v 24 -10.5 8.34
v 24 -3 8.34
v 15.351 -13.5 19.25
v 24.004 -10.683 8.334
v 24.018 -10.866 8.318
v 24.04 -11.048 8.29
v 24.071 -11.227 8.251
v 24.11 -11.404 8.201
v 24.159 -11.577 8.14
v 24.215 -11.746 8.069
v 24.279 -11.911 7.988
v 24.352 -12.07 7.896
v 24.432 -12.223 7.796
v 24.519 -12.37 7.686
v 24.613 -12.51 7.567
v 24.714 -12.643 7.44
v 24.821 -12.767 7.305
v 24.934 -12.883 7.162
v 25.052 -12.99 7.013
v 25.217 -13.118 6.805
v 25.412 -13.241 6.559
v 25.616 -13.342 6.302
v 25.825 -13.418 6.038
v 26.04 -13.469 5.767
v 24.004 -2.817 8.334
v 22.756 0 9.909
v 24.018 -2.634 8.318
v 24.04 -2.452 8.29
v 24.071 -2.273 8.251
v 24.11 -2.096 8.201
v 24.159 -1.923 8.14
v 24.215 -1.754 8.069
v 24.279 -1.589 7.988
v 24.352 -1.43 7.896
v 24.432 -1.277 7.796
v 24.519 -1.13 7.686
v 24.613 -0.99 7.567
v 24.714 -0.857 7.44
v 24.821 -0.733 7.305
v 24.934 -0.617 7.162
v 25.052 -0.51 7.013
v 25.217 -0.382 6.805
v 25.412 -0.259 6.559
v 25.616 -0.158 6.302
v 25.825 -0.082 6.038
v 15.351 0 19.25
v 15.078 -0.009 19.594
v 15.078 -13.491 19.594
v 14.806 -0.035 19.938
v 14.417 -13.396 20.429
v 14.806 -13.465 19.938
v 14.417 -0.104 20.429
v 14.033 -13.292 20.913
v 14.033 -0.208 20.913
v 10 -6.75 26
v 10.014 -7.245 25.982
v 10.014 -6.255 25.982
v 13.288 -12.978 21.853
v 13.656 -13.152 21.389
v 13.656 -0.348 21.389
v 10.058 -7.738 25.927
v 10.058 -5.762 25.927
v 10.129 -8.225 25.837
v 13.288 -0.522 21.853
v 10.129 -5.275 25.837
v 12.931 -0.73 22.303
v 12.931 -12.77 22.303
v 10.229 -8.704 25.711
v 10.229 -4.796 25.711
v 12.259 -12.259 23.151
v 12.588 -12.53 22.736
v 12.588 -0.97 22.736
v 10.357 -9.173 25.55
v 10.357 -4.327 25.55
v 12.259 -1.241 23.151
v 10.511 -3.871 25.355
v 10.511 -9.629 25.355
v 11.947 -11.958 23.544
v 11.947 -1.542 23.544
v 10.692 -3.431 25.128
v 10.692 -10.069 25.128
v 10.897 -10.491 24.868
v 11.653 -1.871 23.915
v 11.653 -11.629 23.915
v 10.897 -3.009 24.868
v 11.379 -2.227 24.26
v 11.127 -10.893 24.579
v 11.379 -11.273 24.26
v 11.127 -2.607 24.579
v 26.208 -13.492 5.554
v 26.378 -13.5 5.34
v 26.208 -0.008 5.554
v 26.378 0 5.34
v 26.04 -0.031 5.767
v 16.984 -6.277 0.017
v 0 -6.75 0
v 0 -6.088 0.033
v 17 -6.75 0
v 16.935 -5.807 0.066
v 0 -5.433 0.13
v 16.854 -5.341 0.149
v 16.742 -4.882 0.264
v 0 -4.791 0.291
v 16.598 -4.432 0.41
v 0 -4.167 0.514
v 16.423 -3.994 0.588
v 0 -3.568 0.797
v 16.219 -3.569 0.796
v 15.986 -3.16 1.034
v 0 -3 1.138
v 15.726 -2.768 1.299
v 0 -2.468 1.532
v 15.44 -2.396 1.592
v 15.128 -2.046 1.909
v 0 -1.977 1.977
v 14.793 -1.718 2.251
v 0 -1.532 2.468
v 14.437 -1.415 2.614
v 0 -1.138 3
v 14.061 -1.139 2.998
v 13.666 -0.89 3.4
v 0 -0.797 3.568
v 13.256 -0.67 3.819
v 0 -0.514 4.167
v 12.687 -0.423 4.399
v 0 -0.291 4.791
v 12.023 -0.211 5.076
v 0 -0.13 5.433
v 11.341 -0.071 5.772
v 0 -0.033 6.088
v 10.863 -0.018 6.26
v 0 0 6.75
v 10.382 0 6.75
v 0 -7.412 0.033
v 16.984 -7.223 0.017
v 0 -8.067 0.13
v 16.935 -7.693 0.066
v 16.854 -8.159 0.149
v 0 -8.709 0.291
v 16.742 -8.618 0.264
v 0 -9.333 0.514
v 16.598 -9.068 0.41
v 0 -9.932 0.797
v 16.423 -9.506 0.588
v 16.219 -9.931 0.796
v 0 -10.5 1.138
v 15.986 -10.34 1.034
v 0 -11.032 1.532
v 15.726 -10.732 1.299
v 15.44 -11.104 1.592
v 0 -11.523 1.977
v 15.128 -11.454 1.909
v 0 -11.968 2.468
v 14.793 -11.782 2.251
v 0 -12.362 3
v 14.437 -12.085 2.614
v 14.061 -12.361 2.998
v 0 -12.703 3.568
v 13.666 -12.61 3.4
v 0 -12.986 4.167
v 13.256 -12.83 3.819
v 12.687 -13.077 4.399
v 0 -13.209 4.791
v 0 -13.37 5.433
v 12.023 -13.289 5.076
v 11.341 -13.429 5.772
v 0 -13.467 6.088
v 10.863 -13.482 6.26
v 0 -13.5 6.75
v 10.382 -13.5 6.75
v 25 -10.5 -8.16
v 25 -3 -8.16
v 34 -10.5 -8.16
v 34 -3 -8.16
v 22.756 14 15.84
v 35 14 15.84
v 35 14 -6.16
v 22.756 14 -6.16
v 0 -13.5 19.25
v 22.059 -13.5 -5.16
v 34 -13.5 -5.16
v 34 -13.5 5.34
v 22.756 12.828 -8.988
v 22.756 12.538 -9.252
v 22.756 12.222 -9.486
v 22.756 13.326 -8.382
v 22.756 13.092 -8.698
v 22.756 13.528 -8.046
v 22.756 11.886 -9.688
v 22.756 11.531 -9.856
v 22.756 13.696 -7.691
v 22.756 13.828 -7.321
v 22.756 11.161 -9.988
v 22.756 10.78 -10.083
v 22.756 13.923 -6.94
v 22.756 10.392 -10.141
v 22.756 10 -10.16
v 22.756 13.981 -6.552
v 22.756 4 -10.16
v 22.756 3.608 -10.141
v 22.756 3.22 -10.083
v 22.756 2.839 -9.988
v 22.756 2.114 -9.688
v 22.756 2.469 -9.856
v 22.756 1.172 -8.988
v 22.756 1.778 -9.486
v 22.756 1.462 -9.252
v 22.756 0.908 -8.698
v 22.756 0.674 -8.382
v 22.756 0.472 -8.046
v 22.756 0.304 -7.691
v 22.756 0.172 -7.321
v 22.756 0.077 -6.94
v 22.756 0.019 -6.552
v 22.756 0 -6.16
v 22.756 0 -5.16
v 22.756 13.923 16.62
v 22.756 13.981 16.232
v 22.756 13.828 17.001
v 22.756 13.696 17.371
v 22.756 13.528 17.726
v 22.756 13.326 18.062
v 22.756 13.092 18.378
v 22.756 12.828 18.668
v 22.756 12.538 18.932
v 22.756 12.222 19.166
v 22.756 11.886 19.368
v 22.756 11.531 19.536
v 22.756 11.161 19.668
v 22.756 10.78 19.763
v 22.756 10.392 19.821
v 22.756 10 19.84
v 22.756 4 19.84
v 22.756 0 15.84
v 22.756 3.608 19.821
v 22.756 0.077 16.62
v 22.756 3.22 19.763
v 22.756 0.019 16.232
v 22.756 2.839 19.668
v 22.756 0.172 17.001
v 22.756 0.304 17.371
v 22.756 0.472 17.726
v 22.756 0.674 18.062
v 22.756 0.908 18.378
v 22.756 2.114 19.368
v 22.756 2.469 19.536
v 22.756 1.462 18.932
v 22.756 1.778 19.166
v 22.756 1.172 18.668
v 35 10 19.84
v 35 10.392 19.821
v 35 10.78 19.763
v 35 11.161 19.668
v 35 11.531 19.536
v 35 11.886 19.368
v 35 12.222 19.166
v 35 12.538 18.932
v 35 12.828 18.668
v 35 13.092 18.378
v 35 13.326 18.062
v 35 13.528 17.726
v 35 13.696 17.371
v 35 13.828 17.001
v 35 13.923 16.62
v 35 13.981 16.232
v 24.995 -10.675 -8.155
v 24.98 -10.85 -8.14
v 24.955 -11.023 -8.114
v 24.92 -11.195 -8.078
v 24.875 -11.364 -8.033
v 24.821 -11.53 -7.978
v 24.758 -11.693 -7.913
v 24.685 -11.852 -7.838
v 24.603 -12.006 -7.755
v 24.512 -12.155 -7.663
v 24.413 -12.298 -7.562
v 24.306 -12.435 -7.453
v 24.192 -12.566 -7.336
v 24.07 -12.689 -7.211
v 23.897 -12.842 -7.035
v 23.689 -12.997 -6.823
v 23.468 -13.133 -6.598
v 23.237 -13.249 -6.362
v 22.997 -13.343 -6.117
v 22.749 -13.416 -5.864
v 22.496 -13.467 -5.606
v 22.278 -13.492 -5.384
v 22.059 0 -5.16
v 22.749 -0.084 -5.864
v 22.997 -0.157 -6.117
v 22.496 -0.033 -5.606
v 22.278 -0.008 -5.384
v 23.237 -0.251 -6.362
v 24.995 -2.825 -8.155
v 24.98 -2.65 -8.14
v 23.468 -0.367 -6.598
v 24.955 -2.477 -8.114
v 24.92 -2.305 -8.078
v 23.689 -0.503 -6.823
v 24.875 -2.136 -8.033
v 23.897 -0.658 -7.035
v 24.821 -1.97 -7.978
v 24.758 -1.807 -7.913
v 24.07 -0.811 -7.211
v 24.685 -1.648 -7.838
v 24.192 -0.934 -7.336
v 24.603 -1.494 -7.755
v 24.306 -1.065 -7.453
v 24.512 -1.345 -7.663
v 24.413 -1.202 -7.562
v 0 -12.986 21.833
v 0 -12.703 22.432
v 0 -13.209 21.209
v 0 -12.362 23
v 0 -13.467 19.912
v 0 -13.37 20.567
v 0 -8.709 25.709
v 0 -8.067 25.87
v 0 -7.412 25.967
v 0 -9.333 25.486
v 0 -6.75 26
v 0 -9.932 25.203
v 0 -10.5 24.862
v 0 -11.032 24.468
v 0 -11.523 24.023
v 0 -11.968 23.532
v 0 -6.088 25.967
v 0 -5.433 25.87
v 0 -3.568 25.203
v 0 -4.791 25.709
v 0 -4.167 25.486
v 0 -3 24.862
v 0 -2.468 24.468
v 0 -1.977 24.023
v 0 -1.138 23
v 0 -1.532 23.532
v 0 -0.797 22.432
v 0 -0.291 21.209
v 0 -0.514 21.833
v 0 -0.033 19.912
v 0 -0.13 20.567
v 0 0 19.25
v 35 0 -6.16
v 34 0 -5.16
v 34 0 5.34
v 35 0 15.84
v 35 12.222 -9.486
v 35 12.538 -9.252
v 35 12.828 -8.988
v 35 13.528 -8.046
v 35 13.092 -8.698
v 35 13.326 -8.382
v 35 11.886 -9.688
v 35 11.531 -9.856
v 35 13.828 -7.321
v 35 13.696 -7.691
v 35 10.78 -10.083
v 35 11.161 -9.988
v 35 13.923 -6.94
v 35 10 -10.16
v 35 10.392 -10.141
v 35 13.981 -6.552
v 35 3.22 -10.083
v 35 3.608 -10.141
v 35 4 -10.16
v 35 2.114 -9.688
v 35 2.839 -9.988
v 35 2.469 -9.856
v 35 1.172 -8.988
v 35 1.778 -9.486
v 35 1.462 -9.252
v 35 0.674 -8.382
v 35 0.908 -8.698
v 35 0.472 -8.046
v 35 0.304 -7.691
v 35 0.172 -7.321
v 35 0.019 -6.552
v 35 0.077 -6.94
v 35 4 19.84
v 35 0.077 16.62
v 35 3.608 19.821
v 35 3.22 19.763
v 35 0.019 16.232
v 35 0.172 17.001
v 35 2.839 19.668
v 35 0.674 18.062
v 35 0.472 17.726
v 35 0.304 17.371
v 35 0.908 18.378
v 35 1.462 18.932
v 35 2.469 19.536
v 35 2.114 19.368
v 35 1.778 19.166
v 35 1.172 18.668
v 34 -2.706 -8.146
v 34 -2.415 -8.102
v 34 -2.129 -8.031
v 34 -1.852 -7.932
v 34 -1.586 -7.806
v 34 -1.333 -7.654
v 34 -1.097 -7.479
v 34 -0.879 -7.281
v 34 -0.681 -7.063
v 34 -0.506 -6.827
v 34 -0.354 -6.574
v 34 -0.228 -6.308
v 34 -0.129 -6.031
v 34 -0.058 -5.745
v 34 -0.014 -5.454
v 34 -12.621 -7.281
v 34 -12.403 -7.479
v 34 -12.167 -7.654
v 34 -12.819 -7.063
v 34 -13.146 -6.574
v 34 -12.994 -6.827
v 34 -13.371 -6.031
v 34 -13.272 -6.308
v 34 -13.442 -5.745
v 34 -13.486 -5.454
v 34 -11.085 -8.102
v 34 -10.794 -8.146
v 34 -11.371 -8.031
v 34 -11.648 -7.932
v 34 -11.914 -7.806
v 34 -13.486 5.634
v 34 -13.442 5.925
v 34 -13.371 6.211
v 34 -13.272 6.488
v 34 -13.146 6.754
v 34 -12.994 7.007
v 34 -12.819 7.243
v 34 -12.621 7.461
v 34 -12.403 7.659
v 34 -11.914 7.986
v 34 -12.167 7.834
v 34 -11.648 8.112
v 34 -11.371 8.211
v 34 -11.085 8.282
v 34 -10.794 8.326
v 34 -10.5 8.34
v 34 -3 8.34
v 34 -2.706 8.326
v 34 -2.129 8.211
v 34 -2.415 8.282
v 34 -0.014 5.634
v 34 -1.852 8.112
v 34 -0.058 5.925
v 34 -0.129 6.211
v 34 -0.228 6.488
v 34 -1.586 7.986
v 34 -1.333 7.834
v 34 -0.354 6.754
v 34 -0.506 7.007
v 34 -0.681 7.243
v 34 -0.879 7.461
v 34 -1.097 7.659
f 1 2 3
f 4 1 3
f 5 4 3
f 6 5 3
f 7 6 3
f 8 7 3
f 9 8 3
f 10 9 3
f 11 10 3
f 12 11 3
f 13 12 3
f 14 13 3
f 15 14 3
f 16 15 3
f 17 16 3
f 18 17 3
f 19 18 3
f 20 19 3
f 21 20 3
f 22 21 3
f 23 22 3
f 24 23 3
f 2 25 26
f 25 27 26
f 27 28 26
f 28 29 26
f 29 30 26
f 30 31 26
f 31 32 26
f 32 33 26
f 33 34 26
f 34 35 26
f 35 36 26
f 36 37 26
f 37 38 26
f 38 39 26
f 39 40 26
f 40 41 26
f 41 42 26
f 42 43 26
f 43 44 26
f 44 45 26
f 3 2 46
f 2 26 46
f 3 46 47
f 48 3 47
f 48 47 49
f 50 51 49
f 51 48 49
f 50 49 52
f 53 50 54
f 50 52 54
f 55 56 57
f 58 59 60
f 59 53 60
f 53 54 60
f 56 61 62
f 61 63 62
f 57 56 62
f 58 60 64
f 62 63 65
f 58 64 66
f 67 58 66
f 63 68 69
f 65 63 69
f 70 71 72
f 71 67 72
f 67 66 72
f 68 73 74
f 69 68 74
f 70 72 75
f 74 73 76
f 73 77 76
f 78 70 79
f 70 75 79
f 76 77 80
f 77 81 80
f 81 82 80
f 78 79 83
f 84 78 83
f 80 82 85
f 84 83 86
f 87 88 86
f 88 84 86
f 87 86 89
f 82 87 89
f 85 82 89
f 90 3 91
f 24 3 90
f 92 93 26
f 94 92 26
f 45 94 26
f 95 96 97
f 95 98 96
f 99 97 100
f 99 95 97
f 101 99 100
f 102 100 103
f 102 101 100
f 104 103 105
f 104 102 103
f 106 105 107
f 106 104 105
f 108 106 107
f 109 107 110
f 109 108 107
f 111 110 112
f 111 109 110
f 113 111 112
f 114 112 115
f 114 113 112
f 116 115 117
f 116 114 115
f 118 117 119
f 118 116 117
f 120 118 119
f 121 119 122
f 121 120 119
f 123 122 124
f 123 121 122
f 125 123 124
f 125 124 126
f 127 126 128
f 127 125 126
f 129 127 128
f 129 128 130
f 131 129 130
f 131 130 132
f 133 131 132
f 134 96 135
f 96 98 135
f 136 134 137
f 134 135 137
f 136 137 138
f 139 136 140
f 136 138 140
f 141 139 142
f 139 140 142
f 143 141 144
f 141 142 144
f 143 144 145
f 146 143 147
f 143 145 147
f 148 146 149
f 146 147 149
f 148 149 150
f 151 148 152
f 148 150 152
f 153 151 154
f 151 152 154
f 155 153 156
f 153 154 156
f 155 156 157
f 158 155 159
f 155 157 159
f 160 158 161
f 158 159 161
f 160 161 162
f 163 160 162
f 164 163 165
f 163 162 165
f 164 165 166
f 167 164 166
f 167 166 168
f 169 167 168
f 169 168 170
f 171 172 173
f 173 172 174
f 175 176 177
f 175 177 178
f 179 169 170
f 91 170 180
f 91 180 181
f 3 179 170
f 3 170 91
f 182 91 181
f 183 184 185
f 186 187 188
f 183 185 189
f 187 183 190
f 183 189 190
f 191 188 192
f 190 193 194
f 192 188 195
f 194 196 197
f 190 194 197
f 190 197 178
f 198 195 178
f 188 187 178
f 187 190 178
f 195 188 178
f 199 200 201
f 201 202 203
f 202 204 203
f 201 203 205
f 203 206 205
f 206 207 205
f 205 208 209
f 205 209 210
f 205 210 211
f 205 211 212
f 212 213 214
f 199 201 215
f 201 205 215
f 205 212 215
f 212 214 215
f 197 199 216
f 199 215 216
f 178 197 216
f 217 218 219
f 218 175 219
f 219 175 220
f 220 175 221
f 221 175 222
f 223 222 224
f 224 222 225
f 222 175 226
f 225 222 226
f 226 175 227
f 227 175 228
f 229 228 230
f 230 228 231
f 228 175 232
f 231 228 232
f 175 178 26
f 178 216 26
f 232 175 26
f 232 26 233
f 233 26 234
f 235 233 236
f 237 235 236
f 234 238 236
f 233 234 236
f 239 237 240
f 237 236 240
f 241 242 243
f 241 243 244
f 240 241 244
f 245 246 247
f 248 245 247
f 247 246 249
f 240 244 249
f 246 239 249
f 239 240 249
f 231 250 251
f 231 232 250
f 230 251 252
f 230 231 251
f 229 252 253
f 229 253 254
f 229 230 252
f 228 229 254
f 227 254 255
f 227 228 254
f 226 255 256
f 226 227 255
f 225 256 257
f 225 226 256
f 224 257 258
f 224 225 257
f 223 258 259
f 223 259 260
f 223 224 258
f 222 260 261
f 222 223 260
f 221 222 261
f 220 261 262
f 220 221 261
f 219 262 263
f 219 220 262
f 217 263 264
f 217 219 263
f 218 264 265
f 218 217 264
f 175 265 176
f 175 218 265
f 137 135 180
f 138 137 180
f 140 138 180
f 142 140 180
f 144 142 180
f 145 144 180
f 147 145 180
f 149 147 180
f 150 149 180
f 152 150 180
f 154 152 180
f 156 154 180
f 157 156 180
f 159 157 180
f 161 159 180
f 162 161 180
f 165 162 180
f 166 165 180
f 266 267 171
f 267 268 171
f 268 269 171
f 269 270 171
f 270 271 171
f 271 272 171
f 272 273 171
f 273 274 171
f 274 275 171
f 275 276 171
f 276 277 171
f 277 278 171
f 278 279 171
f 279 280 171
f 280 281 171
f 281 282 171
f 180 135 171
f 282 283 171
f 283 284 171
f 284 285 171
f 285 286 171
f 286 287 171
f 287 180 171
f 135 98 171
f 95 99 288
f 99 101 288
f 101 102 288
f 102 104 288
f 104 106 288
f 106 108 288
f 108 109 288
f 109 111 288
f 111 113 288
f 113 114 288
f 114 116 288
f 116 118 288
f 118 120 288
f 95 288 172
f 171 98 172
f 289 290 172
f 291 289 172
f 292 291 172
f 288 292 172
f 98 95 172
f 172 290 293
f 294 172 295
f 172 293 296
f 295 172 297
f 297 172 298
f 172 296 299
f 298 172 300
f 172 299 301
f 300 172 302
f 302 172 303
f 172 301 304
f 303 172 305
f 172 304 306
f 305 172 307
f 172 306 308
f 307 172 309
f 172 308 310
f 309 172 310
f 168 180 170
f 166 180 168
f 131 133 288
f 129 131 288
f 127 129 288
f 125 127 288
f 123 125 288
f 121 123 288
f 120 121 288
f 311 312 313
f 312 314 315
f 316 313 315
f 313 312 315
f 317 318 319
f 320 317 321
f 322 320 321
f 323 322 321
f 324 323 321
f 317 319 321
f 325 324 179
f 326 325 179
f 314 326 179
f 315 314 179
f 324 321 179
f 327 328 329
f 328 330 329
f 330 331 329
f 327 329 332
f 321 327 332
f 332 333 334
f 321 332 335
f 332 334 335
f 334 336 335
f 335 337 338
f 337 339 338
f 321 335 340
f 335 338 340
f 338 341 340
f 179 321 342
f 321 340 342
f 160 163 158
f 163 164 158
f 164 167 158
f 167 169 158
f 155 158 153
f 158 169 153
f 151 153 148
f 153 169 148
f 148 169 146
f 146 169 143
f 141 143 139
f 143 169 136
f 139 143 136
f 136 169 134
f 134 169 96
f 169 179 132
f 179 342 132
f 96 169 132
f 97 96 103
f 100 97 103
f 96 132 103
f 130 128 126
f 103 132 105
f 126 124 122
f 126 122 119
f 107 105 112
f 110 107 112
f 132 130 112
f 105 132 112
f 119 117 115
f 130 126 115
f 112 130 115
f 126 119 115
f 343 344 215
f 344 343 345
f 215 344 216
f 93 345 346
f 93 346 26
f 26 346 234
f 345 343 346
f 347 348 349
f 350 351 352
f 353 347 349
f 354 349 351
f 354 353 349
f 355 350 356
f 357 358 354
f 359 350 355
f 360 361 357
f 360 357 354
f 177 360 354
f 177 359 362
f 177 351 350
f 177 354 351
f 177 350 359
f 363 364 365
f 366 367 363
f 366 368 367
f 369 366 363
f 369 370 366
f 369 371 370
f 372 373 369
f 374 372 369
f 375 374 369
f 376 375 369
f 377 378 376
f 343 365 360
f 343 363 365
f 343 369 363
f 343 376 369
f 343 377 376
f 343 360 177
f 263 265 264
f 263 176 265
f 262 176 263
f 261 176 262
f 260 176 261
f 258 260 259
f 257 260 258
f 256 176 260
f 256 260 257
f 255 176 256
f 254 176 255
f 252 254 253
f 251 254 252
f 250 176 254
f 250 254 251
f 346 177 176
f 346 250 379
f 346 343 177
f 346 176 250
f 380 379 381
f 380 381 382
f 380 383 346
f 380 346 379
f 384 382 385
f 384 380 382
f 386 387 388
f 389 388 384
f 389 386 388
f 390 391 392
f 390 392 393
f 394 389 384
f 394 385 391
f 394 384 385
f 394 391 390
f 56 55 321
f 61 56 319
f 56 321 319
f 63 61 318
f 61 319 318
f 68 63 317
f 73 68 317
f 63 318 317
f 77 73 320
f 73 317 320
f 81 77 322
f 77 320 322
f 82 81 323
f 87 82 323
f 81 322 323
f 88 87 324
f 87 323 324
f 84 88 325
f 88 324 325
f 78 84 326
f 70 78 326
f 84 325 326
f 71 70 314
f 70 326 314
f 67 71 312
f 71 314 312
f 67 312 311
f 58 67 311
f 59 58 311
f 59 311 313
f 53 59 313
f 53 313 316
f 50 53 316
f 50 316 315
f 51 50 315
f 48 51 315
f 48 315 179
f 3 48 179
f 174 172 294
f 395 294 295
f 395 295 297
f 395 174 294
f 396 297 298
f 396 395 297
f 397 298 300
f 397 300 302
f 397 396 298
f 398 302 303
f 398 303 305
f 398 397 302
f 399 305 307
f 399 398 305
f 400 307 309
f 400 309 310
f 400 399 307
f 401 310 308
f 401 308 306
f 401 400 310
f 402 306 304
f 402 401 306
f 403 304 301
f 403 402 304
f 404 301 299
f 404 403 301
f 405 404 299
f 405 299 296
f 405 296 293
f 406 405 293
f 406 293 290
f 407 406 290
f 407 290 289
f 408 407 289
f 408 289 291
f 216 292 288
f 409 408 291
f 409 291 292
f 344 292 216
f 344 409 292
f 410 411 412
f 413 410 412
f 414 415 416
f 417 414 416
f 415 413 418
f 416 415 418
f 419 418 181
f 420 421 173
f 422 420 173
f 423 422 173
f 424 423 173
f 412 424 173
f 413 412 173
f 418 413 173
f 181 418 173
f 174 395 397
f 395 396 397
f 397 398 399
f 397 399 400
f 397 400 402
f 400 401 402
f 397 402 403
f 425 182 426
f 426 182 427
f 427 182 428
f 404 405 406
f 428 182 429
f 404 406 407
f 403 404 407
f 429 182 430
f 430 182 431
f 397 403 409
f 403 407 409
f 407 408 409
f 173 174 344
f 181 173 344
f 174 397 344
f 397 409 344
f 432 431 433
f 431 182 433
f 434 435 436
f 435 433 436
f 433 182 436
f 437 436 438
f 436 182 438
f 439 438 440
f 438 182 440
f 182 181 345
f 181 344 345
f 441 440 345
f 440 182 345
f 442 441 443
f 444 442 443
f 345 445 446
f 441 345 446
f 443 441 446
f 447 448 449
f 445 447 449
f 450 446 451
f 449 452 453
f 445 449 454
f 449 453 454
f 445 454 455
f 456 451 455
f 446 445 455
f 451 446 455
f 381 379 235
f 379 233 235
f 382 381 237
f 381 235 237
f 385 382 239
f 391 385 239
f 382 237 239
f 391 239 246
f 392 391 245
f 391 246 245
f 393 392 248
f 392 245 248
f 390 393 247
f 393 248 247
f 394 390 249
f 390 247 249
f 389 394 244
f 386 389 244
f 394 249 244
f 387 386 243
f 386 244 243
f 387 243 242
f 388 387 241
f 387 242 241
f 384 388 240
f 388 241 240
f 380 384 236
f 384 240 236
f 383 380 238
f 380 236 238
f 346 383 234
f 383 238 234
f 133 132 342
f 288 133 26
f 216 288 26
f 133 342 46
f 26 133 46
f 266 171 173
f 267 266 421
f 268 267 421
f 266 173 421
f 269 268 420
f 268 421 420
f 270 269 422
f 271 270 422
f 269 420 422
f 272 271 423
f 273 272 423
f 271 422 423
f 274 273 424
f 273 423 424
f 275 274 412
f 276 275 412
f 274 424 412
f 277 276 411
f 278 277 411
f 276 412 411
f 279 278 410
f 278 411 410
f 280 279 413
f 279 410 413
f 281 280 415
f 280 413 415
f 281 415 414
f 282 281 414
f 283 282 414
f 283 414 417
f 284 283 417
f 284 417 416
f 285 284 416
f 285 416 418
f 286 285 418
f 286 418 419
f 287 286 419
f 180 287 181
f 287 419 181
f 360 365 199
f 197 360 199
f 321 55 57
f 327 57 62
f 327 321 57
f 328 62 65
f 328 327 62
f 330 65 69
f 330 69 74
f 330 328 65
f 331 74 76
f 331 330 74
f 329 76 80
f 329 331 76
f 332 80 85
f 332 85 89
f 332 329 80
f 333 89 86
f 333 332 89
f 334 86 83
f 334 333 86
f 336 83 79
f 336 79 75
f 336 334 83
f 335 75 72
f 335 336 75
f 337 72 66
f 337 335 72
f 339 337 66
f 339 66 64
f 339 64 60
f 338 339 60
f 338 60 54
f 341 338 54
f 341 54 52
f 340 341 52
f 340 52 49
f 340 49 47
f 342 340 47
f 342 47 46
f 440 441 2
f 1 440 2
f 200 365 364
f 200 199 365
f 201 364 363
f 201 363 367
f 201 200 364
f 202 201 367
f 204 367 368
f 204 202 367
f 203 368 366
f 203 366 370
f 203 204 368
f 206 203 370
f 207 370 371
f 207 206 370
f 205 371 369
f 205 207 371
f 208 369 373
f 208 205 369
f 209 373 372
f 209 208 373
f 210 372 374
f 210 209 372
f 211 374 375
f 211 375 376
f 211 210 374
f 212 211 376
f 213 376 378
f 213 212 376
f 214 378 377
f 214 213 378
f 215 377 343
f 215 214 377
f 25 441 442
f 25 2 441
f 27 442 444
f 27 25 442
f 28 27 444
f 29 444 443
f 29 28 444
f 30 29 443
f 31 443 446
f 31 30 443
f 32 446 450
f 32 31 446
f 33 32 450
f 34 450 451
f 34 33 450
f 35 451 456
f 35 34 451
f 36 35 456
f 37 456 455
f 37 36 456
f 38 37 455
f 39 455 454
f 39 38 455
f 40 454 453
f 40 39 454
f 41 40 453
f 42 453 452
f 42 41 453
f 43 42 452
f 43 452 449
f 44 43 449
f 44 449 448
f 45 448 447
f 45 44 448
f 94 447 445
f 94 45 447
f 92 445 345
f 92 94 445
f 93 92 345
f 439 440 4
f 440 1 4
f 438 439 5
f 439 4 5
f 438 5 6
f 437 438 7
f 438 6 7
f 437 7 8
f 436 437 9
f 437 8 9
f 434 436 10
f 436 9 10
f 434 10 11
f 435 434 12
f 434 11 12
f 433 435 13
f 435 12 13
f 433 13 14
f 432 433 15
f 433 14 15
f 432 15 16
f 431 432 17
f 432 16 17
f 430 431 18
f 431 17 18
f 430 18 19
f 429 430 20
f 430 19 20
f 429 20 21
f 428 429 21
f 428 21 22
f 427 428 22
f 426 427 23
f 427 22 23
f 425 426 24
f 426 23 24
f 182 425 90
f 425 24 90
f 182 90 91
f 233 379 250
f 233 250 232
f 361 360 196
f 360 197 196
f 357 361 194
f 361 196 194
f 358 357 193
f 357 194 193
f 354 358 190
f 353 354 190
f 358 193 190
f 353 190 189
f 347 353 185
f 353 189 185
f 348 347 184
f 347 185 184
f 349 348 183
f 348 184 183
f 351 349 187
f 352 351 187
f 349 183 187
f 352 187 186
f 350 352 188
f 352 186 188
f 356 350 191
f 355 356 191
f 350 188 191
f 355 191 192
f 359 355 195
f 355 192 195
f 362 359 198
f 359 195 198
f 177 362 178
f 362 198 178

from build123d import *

# Parameters (mm, degrees)
F1_DEPTH = 13.5
F2_R     = 6.74999
F3_R     = 3
F4_W     = 12.2435482951
F4_H     = 30
F5_DEPTH = 14
F6_R     = 4


# Not quite as in the source:
# - a fillet or chamfer is up to 0.001 mm smaller than in the source, because OpenCascade refuses the exact size


with BuildPart() as f1:
    # F0 (on Front) → F1 (new body)
    with BuildSketch(Plane.XZ):
        Polygon((0, 26), (0, 0), (17, 0), (25, -8.16), (34, -8.16), (34, 8.34), (24, 8.34), (10, 26), align=None)
    extrude(amount=F1_DEPTH)

    # F2 (radius 6.75 in the source; OpenCascade refuses exactly that, so slightly less here)
    f2_edges = [f1.edges().sort_by_distance(p)[0] for p in [
        (5, 0, 26),
        (5, -13.5, 26),
        (8.5, 0, 0),
        (8.5, -13.5, 0),
    ]]
    fillet(f2_edges, radius=F2_R)

    # F3
    f3_edges = [f1.edges().sort_by_distance(p)[0] for p in [
        (29, -13.5, 8.34),
        (29, 0, 8.34),
        (29.5, 0, -8.16),
        (29.5, -13.5, -8.16),
    ]]
    fillet(f3_edges, radius=F3_R)

    # F4 (on face) → F5 (join)
    with BuildSketch(Plane(origin=(0, 0, 0), x_dir=(-1, 0, 0), z_dir=(0, 1, 0))):
        with Locations((-28.8782258524, 4.84)):
            Rectangle(F4_W, F4_H)
    extrude(amount=F5_DEPTH)

    # F6
    f6_edges = [f1.edges().sort_by_distance(p)[0] for p in [
        (28.878226, 14, 19.84),
        (28.878226, 0, 19.84),
        (28.878226, 14, -10.16),
        (28.878226, 0, -10.16),
    ]]
    fillet(f6_edges, radius=F6_R)


solid = f1.part
